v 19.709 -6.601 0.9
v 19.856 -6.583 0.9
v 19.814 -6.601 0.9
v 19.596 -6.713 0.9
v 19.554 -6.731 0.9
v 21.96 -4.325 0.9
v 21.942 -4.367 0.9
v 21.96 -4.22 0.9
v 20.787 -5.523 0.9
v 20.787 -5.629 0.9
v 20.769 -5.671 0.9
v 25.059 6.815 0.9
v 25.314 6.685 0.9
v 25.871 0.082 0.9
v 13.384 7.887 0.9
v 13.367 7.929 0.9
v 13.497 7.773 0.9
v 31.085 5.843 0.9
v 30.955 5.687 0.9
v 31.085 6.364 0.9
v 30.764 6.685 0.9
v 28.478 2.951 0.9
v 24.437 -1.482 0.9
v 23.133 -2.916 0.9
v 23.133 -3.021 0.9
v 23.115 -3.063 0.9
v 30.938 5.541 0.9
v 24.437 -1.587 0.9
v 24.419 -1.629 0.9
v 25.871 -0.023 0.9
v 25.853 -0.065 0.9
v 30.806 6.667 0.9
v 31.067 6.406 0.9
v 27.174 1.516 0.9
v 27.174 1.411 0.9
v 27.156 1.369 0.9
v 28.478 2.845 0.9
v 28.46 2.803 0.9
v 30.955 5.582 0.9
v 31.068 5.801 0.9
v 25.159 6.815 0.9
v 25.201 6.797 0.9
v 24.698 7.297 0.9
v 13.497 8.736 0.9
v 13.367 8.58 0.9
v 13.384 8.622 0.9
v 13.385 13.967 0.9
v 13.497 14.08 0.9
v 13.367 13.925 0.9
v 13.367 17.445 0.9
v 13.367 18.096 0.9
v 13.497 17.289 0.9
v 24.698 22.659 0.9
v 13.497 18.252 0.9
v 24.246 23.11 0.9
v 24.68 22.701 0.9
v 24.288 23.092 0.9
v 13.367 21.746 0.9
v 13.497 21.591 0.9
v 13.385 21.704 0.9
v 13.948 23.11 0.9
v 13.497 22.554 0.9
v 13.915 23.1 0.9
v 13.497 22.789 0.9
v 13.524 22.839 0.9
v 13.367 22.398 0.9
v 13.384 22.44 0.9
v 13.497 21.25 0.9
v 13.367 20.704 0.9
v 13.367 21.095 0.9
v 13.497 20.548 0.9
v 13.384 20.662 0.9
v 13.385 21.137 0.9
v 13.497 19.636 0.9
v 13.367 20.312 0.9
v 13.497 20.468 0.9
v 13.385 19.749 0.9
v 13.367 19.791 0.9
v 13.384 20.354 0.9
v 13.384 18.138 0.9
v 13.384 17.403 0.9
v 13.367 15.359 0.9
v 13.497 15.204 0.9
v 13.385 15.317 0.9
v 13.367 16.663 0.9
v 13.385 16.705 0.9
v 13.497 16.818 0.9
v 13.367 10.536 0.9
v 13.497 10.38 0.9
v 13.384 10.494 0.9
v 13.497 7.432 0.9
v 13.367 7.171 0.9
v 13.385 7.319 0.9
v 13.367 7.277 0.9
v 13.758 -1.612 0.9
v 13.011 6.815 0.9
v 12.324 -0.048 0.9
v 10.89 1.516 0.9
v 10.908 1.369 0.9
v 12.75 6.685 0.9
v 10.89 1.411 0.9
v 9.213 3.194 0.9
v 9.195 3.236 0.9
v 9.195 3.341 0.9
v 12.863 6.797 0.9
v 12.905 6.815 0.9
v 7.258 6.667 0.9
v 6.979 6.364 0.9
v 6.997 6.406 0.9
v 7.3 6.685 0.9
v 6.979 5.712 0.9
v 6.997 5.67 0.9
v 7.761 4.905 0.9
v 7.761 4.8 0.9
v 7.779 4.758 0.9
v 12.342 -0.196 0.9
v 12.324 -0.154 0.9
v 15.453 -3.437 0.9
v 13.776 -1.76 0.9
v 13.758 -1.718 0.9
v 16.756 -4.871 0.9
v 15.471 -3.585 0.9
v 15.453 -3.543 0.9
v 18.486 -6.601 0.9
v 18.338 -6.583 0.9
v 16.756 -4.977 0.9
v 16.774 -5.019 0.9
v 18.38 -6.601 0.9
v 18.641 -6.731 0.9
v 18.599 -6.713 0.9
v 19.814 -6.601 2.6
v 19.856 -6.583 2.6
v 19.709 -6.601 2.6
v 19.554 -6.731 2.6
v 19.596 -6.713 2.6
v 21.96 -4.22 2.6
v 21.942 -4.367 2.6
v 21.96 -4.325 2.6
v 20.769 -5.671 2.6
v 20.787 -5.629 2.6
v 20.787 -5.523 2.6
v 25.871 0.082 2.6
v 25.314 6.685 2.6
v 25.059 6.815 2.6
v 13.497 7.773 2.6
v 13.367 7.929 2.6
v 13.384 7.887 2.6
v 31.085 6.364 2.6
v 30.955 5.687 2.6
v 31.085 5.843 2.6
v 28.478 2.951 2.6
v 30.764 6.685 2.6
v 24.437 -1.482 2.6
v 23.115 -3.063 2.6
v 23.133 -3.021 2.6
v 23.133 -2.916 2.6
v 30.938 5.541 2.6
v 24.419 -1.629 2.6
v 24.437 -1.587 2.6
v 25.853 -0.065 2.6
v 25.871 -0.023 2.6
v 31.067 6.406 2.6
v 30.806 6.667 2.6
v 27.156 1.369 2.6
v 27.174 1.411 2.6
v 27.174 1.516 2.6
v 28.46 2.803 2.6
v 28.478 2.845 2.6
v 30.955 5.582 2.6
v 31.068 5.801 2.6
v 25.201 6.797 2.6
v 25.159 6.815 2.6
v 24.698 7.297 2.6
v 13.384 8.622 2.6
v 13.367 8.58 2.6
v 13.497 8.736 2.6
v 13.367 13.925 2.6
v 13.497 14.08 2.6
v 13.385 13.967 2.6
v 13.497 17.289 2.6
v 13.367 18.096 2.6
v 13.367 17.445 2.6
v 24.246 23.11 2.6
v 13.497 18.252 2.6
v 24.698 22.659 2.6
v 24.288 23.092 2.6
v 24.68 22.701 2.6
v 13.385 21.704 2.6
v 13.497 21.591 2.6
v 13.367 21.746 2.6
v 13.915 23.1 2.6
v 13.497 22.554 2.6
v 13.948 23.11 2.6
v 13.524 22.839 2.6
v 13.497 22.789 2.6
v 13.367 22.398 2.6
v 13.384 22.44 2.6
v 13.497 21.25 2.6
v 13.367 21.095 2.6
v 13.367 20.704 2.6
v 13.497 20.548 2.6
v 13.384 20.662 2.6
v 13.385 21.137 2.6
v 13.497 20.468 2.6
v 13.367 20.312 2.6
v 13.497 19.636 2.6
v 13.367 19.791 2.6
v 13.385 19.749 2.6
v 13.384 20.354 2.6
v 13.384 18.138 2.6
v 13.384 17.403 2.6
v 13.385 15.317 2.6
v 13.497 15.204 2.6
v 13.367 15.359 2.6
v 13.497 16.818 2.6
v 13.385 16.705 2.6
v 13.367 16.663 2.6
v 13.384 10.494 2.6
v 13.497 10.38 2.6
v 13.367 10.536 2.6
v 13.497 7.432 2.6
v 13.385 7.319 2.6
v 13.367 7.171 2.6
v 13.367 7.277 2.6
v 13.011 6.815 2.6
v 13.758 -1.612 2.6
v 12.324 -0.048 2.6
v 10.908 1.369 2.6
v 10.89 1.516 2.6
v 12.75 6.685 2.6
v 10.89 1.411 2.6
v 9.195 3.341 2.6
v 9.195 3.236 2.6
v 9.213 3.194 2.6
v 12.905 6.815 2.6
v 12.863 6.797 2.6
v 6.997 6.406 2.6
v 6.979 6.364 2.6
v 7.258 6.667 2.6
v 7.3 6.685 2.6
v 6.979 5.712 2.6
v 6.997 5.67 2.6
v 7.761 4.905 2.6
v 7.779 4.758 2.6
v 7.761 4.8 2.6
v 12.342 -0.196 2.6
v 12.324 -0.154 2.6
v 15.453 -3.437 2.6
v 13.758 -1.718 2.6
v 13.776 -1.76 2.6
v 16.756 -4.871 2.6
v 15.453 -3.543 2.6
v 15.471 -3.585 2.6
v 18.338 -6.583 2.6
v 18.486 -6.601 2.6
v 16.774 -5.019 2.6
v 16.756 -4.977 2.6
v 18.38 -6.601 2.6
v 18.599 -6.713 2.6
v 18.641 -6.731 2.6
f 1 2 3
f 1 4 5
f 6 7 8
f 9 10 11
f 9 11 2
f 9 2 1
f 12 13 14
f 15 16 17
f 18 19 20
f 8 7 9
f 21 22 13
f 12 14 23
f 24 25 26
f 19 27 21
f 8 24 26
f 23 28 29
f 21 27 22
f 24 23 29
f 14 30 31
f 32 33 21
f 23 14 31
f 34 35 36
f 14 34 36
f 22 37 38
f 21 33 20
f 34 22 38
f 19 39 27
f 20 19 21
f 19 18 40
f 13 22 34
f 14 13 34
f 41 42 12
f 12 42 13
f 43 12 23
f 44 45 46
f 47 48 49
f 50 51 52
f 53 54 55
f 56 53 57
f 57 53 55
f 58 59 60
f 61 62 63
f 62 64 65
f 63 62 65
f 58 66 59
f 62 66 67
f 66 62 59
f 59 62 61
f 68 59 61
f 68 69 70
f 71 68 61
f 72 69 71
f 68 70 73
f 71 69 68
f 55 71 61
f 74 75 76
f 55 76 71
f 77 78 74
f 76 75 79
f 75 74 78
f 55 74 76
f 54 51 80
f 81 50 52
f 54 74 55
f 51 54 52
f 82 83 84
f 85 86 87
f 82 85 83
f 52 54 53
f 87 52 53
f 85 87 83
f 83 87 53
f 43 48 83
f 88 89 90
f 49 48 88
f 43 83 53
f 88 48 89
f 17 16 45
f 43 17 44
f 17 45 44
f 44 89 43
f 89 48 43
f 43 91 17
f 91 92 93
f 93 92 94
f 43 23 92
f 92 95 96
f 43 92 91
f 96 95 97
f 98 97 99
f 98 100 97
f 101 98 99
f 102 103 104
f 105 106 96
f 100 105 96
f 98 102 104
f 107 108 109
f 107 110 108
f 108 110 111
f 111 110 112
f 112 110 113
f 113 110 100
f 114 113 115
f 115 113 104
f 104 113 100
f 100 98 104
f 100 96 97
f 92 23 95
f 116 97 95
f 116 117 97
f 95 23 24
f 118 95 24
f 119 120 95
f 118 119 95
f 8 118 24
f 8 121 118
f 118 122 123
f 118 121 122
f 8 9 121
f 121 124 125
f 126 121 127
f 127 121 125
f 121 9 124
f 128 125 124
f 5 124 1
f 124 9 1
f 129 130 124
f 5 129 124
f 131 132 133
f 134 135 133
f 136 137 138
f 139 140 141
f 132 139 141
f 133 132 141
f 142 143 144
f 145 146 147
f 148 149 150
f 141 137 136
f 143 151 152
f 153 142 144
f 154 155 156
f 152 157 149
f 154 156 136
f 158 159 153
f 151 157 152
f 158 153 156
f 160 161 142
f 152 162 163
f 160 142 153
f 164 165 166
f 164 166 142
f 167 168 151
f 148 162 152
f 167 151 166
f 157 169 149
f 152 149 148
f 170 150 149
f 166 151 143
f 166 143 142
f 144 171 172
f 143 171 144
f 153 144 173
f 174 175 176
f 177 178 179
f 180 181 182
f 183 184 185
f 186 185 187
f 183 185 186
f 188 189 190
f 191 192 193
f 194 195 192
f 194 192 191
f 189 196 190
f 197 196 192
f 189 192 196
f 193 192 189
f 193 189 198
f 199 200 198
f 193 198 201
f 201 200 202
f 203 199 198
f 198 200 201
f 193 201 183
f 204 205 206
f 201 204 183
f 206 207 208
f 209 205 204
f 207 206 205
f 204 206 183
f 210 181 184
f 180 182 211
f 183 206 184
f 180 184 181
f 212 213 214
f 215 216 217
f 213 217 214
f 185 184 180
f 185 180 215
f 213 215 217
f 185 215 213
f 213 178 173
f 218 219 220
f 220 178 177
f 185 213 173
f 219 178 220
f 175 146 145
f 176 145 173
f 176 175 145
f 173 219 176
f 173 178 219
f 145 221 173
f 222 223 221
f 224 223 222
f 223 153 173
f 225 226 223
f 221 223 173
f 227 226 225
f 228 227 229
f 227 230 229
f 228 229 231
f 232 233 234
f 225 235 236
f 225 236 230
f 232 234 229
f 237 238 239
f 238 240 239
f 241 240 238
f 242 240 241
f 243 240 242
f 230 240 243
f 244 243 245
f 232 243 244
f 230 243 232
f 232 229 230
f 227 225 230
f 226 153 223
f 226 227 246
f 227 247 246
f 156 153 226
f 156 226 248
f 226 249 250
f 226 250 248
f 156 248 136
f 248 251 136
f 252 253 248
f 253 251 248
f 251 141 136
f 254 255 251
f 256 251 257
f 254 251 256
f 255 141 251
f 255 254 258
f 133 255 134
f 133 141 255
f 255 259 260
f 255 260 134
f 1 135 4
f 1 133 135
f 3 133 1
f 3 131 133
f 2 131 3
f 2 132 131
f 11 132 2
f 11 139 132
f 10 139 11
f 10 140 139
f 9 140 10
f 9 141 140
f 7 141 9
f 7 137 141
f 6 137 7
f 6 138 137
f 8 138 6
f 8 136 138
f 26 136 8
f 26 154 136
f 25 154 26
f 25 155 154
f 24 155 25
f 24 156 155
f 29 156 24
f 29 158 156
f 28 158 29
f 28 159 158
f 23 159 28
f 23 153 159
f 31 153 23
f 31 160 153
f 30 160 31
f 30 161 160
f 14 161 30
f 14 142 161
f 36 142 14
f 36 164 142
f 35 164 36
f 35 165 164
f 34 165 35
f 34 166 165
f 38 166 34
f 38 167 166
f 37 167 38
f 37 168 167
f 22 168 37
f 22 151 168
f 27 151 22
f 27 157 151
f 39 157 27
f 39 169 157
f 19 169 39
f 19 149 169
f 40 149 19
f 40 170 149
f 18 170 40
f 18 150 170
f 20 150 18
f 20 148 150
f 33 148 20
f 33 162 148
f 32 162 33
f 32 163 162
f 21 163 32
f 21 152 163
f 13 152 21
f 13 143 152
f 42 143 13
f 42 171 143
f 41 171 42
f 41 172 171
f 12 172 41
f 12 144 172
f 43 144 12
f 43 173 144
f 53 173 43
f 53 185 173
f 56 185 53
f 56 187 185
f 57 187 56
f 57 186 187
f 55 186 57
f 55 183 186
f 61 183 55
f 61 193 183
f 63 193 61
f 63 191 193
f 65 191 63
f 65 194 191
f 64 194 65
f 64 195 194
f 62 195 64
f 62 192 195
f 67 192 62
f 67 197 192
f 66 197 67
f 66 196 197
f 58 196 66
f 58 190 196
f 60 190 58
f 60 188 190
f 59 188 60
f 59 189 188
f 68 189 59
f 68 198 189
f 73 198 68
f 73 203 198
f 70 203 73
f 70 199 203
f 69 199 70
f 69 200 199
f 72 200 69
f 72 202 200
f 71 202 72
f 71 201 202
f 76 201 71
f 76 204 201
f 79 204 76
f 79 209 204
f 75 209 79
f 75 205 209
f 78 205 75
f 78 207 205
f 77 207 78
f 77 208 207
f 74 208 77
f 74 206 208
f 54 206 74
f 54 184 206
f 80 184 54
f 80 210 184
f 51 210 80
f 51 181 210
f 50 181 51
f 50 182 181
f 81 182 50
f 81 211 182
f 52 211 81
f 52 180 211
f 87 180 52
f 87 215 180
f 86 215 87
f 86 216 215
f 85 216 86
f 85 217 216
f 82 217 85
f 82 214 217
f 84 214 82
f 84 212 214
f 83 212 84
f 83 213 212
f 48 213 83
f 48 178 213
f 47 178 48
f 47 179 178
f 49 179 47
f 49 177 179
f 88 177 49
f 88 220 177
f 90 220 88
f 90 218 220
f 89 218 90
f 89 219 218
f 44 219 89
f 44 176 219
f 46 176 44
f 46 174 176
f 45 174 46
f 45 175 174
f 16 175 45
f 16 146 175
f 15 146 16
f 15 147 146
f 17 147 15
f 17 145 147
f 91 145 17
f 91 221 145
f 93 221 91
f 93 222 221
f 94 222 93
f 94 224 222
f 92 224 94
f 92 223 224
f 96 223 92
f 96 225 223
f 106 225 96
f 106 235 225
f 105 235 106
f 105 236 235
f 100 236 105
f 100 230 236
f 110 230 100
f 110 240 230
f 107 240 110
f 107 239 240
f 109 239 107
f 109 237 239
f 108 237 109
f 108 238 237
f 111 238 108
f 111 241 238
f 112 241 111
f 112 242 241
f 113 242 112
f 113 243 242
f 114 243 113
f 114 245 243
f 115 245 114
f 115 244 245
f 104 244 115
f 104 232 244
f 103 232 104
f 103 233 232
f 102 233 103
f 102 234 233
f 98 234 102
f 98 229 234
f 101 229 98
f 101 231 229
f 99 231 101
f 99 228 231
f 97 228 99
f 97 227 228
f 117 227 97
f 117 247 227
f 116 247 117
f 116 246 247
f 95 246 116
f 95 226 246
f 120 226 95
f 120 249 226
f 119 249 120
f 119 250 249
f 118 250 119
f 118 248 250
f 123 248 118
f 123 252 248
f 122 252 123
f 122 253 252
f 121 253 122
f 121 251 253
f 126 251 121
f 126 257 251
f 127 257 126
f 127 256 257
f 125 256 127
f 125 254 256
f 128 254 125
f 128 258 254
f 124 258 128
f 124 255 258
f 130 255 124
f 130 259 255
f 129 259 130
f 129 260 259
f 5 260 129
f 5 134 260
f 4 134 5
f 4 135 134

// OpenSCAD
$fn = 24;
translate([0, -2.500, 0.900])
  linear_extrude(height=1.700) {
offset(r=0.06, $fn=8) {
    polygon(points=[[13.948,25.550],[13.557,25.289],[13.557,25.029],[13.427,24.898],[13.427,24.246],[13.557,24.116],[13.557,23.725],[13.427,23.595],[13.427,23.204],[13.557,23.073],[13.557,22.943],[13.427,22.812],[13.427,22.291],[13.557,22.161],[13.557,20.727],[13.427,20.596],[13.427,19.945],[13.557,19.814],[13.557,19.293],[13.427,19.163],[13.427,17.859],[13.557,17.729],[13.557,16.555],[13.427,16.425],[13.427,13.036],[13.557,12.905],[13.557,11.211],[13.427,11.080],[13.427,10.429],[13.557,10.298],[13.557,9.907],[13.427,9.777],[13.427,9.646],[13.036,9.255],[12.905,9.255],[12.775,9.125],[7.300,9.125],[7.039,8.864],[7.039,8.212],[7.821,7.430],[7.821,7.300],[9.255,5.866],[9.255,5.736],[10.950,4.041],[10.950,3.911],[12.384,2.477],[12.384,2.346],[13.818,0.913],[13.818,0.782],[15.513,-0.912],[15.513,-1.043],[16.816,-2.346],[16.816,-2.477],[18.380,-4.041],[18.511,-4.041],[18.641,-4.171],[19.554,-4.171],[19.684,-4.041],[19.814,-4.041],[20.727,-3.129],[20.727,-2.998],[21.900,-1.825],[21.900,-1.695],[23.073,-0.521],[23.073,-0.391],[24.377,0.913],[24.377,1.043],[25.811,2.477],[25.811,2.607],[27.114,3.911],[27.114,4.041],[28.418,5.345],[28.418,5.475],[30.895,8.082],[30.895,8.212],[31.025,8.343],[31.025,8.864],[30.764,9.125],[25.289,9.125],[25.159,9.255],[25.029,9.255],[24.638,9.777],[24.638,25.159],[24.246,25.550]], paths=[[0,1,2,3,4,5,6,7,8,9,10,11,12,13,14,15,16,17,18,19,20,21,22,23,24,25,26,27,28,29,30,31,32,33,34,35,36,37,38,39,40,41,42,43,44,45,46,47,48,49,50,51,52,53,54,55,56,57,58,59,60,61,62,63,64,65,66,67,68,69,70,71,72,73,74,75,76,77,78,79,80,81,82,83]]);
}
}
